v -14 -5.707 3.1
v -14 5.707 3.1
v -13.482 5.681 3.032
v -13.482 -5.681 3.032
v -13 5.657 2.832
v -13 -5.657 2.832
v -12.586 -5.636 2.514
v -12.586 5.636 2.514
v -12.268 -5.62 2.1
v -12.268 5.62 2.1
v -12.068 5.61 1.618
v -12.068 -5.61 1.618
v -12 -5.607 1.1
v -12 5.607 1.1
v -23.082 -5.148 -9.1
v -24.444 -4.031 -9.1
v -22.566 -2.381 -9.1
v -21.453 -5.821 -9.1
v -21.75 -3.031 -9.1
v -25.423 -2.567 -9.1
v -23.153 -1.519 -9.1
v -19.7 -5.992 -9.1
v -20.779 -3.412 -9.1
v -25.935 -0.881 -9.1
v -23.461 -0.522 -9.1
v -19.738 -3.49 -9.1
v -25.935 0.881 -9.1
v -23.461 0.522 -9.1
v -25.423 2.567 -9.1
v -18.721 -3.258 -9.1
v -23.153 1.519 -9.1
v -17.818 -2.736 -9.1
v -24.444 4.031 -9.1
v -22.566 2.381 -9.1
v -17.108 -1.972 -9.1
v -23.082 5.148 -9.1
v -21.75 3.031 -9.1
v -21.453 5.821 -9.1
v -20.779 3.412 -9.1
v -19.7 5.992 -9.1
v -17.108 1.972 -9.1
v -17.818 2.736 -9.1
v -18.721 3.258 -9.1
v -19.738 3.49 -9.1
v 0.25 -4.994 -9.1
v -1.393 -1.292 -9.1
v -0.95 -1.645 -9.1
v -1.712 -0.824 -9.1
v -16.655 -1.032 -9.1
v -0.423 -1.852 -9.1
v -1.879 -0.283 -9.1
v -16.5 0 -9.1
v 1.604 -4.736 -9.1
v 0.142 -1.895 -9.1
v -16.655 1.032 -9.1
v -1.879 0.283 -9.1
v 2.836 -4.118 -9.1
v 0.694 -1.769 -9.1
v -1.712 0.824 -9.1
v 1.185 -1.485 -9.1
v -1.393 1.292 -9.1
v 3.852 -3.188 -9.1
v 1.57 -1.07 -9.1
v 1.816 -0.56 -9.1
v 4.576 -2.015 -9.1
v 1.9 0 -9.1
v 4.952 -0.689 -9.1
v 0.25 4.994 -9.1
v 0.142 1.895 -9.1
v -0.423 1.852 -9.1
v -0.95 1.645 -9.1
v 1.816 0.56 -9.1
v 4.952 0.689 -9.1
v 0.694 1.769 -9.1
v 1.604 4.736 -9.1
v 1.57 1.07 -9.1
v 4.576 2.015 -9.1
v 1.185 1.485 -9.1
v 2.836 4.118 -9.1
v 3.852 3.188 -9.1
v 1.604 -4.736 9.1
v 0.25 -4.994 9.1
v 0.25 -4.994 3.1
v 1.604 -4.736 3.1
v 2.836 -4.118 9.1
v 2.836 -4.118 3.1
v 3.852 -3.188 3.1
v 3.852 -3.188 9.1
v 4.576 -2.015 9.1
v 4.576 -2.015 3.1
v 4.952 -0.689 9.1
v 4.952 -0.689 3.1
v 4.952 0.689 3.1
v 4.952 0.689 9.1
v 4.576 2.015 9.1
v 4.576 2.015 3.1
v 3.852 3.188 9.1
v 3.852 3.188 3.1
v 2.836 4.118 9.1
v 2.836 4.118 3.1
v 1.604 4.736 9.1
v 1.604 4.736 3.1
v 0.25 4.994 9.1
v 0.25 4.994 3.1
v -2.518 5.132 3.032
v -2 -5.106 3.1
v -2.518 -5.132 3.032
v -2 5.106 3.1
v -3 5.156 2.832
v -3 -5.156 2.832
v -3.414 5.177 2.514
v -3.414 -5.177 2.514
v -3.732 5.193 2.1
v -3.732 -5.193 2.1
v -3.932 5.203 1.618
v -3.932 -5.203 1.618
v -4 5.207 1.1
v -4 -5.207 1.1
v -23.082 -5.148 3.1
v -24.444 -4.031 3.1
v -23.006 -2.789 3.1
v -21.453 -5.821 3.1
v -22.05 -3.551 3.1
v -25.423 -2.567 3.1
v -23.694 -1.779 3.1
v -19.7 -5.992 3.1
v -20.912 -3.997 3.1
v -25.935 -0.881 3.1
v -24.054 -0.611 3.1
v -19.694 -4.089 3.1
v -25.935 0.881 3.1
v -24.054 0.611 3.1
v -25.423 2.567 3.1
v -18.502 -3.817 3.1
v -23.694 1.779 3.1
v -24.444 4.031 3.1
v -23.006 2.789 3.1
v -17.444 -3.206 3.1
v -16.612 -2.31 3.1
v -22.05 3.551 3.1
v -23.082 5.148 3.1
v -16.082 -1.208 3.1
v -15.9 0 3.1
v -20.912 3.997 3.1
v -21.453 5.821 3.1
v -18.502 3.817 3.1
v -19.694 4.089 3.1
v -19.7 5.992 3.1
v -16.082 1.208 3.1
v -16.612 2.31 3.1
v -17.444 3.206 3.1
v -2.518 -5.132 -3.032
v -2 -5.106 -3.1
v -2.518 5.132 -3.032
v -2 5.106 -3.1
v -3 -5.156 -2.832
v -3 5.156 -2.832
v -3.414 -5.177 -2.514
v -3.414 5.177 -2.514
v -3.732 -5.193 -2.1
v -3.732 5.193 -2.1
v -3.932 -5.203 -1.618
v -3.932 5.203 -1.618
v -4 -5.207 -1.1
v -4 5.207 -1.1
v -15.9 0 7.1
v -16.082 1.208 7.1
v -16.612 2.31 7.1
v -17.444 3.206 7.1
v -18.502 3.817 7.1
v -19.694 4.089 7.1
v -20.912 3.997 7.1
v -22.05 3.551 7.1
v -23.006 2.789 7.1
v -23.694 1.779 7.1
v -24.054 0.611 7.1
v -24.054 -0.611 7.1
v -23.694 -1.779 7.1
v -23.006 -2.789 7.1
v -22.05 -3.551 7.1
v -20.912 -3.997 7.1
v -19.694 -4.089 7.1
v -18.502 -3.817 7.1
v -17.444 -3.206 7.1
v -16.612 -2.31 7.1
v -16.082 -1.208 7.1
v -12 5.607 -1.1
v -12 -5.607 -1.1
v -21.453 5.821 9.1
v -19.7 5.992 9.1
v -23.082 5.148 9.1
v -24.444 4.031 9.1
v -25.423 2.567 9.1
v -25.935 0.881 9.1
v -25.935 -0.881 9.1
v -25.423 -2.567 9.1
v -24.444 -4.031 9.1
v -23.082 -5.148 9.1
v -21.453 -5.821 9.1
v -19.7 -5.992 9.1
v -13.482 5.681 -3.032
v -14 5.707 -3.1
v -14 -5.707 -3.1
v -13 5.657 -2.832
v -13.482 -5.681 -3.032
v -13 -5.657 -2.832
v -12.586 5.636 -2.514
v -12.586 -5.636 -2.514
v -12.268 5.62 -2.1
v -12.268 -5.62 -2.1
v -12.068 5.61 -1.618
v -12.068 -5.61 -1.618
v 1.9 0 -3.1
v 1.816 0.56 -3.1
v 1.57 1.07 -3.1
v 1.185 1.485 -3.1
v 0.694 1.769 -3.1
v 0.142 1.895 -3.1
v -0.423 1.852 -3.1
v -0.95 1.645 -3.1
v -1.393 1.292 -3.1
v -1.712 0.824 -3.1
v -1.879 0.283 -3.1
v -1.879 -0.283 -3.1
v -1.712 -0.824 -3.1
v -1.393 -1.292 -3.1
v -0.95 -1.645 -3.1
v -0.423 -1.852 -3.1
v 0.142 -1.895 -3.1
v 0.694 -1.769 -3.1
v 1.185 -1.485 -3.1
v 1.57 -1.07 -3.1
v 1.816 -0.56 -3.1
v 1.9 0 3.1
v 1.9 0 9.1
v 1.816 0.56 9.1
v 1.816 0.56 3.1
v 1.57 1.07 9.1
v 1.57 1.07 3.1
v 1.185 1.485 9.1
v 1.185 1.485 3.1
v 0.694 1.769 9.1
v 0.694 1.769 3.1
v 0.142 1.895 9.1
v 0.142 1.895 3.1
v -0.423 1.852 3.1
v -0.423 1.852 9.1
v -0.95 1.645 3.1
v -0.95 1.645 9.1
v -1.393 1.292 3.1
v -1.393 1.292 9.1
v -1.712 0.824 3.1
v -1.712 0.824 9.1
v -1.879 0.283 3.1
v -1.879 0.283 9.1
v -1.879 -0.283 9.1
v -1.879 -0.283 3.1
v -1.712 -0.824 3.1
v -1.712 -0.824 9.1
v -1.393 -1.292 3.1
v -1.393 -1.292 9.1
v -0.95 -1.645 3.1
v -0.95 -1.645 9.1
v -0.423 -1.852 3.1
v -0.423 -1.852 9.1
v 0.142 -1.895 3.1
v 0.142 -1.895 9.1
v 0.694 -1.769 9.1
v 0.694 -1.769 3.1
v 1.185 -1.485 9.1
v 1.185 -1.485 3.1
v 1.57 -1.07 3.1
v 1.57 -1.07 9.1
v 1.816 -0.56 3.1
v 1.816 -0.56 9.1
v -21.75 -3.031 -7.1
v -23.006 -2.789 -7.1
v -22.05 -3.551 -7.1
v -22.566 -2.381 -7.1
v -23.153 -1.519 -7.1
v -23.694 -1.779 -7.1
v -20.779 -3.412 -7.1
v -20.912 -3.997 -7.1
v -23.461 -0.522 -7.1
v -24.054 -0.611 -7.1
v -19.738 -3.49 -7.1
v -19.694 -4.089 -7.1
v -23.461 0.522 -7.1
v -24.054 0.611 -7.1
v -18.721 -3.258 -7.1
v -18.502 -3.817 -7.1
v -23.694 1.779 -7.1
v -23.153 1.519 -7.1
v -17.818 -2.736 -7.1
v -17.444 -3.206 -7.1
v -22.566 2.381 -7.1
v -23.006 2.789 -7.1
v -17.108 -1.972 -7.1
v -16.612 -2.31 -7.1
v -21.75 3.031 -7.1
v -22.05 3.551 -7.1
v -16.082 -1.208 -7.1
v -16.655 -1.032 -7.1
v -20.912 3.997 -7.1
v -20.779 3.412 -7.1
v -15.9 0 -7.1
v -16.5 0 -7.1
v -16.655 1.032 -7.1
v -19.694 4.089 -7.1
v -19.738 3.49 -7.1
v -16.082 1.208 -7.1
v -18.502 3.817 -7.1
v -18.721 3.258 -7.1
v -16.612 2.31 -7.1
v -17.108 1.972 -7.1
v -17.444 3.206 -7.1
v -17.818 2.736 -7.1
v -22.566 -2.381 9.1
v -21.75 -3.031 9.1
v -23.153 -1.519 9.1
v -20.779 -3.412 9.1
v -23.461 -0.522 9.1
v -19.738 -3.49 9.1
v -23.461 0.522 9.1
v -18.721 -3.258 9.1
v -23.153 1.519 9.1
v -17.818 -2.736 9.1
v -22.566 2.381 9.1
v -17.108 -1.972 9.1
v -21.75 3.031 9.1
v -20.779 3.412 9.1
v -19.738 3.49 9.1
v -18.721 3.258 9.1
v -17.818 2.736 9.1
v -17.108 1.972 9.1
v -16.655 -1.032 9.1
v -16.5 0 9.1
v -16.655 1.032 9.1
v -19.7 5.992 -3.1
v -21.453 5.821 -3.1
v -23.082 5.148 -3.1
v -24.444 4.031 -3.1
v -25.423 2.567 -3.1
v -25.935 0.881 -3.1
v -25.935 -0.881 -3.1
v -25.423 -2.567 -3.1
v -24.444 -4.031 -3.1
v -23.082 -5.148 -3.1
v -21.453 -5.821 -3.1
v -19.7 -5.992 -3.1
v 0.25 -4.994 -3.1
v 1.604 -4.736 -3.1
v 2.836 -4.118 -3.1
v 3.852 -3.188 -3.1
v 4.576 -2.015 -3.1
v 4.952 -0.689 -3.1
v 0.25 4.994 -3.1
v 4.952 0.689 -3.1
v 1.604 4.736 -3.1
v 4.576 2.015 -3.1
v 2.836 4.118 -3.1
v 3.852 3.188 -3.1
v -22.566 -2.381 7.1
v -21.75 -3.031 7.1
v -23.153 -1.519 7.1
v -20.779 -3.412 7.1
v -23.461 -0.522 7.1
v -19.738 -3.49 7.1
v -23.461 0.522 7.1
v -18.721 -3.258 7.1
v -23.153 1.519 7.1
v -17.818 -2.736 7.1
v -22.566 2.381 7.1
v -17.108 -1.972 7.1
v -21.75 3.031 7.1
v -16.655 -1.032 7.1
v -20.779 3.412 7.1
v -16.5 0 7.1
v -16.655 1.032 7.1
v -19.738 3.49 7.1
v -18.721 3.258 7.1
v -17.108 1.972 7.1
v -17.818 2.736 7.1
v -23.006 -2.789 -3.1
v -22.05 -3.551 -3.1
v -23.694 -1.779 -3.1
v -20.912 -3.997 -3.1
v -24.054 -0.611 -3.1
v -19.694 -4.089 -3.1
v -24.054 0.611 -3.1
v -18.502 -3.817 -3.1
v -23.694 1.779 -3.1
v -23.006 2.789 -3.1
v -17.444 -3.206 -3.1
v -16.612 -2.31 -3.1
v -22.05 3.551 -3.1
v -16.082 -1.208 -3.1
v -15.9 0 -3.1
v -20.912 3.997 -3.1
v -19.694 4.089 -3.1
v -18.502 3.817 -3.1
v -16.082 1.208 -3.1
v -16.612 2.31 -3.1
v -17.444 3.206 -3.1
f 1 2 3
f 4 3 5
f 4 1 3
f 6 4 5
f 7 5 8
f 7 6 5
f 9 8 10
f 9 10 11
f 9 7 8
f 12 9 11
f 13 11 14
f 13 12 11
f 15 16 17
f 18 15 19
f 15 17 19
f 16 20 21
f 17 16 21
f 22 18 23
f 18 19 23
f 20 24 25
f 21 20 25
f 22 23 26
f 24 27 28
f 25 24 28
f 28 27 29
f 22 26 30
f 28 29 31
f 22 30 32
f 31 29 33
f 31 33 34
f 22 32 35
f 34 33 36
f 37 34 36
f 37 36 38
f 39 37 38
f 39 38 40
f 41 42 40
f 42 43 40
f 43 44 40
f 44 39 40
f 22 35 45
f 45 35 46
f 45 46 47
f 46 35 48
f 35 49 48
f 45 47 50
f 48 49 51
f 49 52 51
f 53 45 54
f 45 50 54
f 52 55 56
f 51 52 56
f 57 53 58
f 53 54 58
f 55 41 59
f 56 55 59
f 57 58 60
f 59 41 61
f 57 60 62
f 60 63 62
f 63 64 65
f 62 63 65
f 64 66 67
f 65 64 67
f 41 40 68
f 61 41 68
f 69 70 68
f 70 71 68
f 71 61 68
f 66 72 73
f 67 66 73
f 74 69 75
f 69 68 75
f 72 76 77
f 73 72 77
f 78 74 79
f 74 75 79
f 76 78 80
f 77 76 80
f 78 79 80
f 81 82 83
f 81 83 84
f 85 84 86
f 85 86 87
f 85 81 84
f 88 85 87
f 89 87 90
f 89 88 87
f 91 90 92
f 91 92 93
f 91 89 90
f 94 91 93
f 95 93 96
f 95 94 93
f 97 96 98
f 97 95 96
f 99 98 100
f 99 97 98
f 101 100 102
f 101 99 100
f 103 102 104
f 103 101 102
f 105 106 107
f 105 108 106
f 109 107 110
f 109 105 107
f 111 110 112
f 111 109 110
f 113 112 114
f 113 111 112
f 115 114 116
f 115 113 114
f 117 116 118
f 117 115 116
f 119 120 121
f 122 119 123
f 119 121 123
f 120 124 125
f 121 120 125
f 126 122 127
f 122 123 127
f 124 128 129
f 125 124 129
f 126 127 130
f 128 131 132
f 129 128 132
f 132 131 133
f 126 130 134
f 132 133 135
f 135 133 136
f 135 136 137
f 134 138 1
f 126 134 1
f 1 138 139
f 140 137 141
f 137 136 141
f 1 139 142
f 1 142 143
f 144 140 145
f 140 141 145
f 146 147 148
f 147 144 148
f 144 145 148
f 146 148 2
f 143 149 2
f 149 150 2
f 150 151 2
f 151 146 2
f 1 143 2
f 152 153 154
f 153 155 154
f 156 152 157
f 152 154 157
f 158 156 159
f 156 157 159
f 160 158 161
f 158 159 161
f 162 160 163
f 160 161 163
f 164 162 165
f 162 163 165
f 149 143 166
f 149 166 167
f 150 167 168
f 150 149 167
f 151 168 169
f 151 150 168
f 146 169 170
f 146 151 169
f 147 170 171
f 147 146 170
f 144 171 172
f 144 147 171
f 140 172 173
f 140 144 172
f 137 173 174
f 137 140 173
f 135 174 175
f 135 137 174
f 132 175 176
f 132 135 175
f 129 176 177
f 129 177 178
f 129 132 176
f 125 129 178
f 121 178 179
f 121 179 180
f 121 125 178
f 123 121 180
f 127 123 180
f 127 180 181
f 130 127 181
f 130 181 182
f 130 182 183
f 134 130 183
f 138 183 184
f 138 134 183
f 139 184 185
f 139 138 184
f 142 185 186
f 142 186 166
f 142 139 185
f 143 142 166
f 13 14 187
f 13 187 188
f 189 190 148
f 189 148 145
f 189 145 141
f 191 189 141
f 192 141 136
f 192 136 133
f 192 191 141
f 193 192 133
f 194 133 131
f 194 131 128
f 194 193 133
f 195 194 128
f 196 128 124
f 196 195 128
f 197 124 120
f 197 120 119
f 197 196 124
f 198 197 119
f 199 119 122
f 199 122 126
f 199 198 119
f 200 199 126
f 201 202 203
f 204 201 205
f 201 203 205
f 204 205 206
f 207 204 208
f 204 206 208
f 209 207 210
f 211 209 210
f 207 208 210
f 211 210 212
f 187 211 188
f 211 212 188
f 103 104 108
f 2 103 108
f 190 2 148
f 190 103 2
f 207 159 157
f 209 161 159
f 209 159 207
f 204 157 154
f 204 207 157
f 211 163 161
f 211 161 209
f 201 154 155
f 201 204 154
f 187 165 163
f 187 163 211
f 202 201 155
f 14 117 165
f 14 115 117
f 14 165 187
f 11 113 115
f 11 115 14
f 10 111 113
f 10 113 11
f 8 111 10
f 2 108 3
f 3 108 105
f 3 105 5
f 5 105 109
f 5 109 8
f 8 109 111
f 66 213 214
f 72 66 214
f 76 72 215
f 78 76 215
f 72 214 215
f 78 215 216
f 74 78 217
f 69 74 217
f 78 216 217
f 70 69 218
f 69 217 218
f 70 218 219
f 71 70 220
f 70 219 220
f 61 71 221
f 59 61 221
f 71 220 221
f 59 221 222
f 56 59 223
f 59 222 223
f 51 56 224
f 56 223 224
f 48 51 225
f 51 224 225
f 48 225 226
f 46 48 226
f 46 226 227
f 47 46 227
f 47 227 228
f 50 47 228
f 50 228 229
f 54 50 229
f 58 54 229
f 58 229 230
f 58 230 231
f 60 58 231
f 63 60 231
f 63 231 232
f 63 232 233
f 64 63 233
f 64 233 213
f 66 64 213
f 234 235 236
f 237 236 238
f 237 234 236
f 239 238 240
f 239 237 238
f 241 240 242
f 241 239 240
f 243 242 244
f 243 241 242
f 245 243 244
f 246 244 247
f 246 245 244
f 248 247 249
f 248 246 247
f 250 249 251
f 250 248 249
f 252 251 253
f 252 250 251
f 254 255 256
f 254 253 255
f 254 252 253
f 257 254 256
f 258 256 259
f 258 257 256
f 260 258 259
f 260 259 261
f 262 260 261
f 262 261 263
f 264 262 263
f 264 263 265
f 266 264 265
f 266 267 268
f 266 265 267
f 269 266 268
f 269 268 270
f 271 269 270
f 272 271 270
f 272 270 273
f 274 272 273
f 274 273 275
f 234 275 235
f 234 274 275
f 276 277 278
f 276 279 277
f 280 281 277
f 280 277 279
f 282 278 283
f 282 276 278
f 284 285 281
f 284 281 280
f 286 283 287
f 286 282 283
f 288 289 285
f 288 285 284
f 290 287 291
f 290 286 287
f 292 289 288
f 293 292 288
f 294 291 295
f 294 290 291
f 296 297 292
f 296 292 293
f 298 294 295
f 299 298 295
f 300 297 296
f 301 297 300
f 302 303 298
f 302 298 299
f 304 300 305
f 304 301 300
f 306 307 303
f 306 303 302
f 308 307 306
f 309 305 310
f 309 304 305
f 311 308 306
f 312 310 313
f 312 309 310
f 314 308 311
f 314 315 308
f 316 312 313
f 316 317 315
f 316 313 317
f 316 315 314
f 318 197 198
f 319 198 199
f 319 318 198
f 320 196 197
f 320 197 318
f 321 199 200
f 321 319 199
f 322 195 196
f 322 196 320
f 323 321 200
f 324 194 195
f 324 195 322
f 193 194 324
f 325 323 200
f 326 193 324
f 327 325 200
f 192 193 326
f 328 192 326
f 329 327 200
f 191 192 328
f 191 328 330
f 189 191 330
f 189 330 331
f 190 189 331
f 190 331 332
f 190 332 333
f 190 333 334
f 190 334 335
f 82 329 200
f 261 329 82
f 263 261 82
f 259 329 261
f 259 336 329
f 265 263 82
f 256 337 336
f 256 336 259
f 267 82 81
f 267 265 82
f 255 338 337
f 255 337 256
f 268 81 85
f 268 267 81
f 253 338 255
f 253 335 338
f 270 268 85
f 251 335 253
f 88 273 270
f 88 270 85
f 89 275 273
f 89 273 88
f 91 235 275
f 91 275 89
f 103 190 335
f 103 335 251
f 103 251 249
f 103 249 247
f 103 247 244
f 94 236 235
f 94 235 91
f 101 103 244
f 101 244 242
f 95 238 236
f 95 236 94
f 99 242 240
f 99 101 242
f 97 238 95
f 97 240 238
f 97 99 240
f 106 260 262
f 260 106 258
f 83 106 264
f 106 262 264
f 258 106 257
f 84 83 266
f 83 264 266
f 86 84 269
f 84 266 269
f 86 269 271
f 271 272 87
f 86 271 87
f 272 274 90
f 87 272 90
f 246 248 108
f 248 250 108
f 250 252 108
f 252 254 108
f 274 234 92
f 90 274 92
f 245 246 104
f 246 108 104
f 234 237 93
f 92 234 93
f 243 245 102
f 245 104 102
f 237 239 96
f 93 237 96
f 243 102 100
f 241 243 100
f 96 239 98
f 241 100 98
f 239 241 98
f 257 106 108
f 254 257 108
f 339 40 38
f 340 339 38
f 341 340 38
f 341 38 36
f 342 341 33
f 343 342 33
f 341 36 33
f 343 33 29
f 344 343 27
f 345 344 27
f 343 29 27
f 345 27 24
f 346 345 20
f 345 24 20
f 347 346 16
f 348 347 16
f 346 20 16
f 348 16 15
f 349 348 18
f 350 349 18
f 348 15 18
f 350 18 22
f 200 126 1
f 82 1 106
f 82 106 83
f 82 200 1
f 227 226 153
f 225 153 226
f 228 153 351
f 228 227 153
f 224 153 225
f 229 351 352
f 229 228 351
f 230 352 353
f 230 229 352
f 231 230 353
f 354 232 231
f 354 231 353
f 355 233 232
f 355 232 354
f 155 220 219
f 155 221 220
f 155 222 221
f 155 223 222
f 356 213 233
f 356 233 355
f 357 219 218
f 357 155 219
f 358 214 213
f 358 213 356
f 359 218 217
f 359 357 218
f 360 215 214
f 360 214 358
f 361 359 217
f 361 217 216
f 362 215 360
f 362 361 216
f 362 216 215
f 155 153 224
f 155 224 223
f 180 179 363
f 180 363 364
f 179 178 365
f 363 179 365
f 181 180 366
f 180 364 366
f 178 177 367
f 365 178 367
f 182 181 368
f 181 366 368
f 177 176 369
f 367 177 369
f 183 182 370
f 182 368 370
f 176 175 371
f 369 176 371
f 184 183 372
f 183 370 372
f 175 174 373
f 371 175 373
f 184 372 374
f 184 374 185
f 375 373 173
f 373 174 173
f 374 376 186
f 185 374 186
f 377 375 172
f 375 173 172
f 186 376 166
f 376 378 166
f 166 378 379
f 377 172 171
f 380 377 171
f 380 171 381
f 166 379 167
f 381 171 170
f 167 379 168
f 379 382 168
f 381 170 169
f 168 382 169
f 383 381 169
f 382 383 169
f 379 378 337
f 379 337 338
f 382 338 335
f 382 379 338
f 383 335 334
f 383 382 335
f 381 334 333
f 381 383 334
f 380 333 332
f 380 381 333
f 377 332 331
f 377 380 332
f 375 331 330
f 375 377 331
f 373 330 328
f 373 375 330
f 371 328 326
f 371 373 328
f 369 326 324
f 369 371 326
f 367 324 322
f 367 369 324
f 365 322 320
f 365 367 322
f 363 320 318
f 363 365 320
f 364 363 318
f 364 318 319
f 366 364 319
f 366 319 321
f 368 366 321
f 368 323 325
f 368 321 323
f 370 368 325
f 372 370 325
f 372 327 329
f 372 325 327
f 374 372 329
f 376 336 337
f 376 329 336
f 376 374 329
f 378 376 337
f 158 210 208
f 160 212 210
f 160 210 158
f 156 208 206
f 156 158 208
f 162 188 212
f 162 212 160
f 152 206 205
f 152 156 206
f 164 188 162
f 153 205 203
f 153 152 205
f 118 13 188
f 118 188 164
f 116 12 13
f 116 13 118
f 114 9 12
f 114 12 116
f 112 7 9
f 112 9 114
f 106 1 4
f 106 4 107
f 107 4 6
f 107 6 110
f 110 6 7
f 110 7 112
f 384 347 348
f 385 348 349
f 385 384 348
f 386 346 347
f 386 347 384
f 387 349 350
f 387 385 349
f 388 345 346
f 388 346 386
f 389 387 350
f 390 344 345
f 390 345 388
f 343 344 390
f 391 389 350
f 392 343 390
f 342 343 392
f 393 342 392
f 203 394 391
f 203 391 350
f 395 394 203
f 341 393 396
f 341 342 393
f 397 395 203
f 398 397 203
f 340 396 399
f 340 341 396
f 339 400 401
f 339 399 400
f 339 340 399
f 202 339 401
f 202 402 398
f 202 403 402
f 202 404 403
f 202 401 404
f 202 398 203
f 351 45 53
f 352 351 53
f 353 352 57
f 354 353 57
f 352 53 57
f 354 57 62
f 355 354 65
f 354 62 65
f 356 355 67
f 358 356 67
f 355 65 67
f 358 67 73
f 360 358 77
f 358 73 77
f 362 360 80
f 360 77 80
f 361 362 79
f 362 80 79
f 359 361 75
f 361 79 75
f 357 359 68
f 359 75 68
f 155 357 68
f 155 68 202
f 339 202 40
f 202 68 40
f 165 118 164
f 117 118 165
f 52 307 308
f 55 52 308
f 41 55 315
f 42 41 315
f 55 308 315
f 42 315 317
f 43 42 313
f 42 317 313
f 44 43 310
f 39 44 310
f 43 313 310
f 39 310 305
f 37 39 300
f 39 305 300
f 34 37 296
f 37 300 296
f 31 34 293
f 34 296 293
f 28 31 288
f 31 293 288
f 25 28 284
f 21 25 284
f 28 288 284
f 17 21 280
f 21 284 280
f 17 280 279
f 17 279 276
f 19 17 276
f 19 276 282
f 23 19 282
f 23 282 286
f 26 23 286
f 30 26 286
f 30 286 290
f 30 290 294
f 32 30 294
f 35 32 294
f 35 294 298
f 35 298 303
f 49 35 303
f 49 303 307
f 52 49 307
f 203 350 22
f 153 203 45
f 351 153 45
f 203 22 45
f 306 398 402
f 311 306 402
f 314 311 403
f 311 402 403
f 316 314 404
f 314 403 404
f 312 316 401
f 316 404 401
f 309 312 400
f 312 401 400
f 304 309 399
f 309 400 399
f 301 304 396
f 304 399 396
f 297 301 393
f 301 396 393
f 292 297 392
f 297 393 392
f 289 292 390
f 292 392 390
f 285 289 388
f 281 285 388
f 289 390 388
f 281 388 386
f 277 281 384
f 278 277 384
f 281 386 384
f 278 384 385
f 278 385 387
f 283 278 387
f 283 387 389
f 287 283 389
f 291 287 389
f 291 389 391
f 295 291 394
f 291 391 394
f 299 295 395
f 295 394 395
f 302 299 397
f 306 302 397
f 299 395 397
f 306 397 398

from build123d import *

# Parameters (mm, degrees)
EXTRUDE_START       = -9.1
EXTRUDE_1_DEPTH     = 6
SKETCH_4_R          = 4.1
CUT_EXTRUDE_3_DEPTH = 4
SKETCH_5_R          = 3.5
CUT_EXTRUDE_5_DEPTH = 28.349588662
SKETCH_6_R          = 1.9
CUT_EXTRUDE_6_DEPTH = 10
EXTRUDE_2_DEPTH     = 3.1
FILLET_1_R          = 2


with BuildPart() as part:
    # ｽｹｯﾁ1 → ﾎﾞｽ - 押し出し1 (new body)
    with BuildSketch(Plane.XY.offset(EXTRUDE_START)):
        with BuildLine():
            Line((0.25, 4.993746089), (-19.7, 5.992495307))
            ThreePointArc((-19.7, 5.992495307), (-26, 0), (-19.7, -5.992495307))
            Line((-19.7, -5.992495307), (0.25, -4.993746089))
            ThreePointArc((0.25, -4.993746089), (5, 0), (0.25, 4.993746089))
        make_face()
    extrude_1 = extrude(amount=EXTRUDE_1_DEPTH)

    # ｽｹｯﾁ4 → ｶｯﾄ - 押し出し3 (cut)
    with BuildSketch(Plane.XY.offset(-3.1)):
        with Locations((-20, 0)):
            Circle(SKETCH_4_R)
    cut_extrude_3 = extrude(amount=-CUT_EXTRUDE_3_DEPTH, mode=Mode.SUBTRACT)

    # ｽｹｯﾁ5 → ｶｯﾄ - 押し出し5 (cut, through all)
    with BuildSketch(Plane.XY.offset(-3.1)):
        with Locations((-20, 0)):
            Circle(SKETCH_5_R)
    cut_extrude_5 = extrude(amount=-CUT_EXTRUDE_5_DEPTH, mode=Mode.SUBTRACT)

    # ｽｹｯﾁ6 → ｶｯﾄ - 押し出し6 (cut)
    with BuildSketch(Plane.XY.offset(-3.1)):
        Circle(SKETCH_6_R)
    cut_extrude_6 = extrude(amount=-CUT_EXTRUDE_6_DEPTH, mode=Mode.SUBTRACT)

    # ｽｹｯﾁ7 → ﾎﾞｽ - 押し出し2 (add)
    with BuildSketch(Plane.XY.offset(-3.1)):
        Polygon((-4, 5.206512213), (-12, 5.607013152), (-12, -5.607013152), (-4, -5.206512213), align=None)
    extrude_2 = extrude(amount=EXTRUDE_2_DEPTH)

    # ﾐﾗｰ3: ﾎﾞｽ - 押し出し1, ｶｯﾄ - 押し出し3, ｶｯﾄ - 押し出し5, ｶｯﾄ - 押し出し6, ﾎﾞｽ - 押し出し2 across plane
    add(extrude_1.mirror(Plane.XY))
    add(cut_extrude_3.mirror(Plane.XY), mode=Mode.SUBTRACT)
    add(cut_extrude_5.mirror(Plane.XY), mode=Mode.SUBTRACT)
    add(cut_extrude_6.mirror(Plane.XY), mode=Mode.SUBTRACT)
    add(extrude_2.mirror(Plane.XY))

    # ﾌｨﾚｯﾄ1
    fillet_1_edges = [part.edges().sort_by_distance(p)[0] for p in [
        (-4, 0, -3.1),
        (-12, 0, -3.1),
        (-4, 0, 3.1),
        (-12, 0, 3.1),
    ]]
    fillet(fillet_1_edges, radius=FILLET_1_R)


solid = part.part
